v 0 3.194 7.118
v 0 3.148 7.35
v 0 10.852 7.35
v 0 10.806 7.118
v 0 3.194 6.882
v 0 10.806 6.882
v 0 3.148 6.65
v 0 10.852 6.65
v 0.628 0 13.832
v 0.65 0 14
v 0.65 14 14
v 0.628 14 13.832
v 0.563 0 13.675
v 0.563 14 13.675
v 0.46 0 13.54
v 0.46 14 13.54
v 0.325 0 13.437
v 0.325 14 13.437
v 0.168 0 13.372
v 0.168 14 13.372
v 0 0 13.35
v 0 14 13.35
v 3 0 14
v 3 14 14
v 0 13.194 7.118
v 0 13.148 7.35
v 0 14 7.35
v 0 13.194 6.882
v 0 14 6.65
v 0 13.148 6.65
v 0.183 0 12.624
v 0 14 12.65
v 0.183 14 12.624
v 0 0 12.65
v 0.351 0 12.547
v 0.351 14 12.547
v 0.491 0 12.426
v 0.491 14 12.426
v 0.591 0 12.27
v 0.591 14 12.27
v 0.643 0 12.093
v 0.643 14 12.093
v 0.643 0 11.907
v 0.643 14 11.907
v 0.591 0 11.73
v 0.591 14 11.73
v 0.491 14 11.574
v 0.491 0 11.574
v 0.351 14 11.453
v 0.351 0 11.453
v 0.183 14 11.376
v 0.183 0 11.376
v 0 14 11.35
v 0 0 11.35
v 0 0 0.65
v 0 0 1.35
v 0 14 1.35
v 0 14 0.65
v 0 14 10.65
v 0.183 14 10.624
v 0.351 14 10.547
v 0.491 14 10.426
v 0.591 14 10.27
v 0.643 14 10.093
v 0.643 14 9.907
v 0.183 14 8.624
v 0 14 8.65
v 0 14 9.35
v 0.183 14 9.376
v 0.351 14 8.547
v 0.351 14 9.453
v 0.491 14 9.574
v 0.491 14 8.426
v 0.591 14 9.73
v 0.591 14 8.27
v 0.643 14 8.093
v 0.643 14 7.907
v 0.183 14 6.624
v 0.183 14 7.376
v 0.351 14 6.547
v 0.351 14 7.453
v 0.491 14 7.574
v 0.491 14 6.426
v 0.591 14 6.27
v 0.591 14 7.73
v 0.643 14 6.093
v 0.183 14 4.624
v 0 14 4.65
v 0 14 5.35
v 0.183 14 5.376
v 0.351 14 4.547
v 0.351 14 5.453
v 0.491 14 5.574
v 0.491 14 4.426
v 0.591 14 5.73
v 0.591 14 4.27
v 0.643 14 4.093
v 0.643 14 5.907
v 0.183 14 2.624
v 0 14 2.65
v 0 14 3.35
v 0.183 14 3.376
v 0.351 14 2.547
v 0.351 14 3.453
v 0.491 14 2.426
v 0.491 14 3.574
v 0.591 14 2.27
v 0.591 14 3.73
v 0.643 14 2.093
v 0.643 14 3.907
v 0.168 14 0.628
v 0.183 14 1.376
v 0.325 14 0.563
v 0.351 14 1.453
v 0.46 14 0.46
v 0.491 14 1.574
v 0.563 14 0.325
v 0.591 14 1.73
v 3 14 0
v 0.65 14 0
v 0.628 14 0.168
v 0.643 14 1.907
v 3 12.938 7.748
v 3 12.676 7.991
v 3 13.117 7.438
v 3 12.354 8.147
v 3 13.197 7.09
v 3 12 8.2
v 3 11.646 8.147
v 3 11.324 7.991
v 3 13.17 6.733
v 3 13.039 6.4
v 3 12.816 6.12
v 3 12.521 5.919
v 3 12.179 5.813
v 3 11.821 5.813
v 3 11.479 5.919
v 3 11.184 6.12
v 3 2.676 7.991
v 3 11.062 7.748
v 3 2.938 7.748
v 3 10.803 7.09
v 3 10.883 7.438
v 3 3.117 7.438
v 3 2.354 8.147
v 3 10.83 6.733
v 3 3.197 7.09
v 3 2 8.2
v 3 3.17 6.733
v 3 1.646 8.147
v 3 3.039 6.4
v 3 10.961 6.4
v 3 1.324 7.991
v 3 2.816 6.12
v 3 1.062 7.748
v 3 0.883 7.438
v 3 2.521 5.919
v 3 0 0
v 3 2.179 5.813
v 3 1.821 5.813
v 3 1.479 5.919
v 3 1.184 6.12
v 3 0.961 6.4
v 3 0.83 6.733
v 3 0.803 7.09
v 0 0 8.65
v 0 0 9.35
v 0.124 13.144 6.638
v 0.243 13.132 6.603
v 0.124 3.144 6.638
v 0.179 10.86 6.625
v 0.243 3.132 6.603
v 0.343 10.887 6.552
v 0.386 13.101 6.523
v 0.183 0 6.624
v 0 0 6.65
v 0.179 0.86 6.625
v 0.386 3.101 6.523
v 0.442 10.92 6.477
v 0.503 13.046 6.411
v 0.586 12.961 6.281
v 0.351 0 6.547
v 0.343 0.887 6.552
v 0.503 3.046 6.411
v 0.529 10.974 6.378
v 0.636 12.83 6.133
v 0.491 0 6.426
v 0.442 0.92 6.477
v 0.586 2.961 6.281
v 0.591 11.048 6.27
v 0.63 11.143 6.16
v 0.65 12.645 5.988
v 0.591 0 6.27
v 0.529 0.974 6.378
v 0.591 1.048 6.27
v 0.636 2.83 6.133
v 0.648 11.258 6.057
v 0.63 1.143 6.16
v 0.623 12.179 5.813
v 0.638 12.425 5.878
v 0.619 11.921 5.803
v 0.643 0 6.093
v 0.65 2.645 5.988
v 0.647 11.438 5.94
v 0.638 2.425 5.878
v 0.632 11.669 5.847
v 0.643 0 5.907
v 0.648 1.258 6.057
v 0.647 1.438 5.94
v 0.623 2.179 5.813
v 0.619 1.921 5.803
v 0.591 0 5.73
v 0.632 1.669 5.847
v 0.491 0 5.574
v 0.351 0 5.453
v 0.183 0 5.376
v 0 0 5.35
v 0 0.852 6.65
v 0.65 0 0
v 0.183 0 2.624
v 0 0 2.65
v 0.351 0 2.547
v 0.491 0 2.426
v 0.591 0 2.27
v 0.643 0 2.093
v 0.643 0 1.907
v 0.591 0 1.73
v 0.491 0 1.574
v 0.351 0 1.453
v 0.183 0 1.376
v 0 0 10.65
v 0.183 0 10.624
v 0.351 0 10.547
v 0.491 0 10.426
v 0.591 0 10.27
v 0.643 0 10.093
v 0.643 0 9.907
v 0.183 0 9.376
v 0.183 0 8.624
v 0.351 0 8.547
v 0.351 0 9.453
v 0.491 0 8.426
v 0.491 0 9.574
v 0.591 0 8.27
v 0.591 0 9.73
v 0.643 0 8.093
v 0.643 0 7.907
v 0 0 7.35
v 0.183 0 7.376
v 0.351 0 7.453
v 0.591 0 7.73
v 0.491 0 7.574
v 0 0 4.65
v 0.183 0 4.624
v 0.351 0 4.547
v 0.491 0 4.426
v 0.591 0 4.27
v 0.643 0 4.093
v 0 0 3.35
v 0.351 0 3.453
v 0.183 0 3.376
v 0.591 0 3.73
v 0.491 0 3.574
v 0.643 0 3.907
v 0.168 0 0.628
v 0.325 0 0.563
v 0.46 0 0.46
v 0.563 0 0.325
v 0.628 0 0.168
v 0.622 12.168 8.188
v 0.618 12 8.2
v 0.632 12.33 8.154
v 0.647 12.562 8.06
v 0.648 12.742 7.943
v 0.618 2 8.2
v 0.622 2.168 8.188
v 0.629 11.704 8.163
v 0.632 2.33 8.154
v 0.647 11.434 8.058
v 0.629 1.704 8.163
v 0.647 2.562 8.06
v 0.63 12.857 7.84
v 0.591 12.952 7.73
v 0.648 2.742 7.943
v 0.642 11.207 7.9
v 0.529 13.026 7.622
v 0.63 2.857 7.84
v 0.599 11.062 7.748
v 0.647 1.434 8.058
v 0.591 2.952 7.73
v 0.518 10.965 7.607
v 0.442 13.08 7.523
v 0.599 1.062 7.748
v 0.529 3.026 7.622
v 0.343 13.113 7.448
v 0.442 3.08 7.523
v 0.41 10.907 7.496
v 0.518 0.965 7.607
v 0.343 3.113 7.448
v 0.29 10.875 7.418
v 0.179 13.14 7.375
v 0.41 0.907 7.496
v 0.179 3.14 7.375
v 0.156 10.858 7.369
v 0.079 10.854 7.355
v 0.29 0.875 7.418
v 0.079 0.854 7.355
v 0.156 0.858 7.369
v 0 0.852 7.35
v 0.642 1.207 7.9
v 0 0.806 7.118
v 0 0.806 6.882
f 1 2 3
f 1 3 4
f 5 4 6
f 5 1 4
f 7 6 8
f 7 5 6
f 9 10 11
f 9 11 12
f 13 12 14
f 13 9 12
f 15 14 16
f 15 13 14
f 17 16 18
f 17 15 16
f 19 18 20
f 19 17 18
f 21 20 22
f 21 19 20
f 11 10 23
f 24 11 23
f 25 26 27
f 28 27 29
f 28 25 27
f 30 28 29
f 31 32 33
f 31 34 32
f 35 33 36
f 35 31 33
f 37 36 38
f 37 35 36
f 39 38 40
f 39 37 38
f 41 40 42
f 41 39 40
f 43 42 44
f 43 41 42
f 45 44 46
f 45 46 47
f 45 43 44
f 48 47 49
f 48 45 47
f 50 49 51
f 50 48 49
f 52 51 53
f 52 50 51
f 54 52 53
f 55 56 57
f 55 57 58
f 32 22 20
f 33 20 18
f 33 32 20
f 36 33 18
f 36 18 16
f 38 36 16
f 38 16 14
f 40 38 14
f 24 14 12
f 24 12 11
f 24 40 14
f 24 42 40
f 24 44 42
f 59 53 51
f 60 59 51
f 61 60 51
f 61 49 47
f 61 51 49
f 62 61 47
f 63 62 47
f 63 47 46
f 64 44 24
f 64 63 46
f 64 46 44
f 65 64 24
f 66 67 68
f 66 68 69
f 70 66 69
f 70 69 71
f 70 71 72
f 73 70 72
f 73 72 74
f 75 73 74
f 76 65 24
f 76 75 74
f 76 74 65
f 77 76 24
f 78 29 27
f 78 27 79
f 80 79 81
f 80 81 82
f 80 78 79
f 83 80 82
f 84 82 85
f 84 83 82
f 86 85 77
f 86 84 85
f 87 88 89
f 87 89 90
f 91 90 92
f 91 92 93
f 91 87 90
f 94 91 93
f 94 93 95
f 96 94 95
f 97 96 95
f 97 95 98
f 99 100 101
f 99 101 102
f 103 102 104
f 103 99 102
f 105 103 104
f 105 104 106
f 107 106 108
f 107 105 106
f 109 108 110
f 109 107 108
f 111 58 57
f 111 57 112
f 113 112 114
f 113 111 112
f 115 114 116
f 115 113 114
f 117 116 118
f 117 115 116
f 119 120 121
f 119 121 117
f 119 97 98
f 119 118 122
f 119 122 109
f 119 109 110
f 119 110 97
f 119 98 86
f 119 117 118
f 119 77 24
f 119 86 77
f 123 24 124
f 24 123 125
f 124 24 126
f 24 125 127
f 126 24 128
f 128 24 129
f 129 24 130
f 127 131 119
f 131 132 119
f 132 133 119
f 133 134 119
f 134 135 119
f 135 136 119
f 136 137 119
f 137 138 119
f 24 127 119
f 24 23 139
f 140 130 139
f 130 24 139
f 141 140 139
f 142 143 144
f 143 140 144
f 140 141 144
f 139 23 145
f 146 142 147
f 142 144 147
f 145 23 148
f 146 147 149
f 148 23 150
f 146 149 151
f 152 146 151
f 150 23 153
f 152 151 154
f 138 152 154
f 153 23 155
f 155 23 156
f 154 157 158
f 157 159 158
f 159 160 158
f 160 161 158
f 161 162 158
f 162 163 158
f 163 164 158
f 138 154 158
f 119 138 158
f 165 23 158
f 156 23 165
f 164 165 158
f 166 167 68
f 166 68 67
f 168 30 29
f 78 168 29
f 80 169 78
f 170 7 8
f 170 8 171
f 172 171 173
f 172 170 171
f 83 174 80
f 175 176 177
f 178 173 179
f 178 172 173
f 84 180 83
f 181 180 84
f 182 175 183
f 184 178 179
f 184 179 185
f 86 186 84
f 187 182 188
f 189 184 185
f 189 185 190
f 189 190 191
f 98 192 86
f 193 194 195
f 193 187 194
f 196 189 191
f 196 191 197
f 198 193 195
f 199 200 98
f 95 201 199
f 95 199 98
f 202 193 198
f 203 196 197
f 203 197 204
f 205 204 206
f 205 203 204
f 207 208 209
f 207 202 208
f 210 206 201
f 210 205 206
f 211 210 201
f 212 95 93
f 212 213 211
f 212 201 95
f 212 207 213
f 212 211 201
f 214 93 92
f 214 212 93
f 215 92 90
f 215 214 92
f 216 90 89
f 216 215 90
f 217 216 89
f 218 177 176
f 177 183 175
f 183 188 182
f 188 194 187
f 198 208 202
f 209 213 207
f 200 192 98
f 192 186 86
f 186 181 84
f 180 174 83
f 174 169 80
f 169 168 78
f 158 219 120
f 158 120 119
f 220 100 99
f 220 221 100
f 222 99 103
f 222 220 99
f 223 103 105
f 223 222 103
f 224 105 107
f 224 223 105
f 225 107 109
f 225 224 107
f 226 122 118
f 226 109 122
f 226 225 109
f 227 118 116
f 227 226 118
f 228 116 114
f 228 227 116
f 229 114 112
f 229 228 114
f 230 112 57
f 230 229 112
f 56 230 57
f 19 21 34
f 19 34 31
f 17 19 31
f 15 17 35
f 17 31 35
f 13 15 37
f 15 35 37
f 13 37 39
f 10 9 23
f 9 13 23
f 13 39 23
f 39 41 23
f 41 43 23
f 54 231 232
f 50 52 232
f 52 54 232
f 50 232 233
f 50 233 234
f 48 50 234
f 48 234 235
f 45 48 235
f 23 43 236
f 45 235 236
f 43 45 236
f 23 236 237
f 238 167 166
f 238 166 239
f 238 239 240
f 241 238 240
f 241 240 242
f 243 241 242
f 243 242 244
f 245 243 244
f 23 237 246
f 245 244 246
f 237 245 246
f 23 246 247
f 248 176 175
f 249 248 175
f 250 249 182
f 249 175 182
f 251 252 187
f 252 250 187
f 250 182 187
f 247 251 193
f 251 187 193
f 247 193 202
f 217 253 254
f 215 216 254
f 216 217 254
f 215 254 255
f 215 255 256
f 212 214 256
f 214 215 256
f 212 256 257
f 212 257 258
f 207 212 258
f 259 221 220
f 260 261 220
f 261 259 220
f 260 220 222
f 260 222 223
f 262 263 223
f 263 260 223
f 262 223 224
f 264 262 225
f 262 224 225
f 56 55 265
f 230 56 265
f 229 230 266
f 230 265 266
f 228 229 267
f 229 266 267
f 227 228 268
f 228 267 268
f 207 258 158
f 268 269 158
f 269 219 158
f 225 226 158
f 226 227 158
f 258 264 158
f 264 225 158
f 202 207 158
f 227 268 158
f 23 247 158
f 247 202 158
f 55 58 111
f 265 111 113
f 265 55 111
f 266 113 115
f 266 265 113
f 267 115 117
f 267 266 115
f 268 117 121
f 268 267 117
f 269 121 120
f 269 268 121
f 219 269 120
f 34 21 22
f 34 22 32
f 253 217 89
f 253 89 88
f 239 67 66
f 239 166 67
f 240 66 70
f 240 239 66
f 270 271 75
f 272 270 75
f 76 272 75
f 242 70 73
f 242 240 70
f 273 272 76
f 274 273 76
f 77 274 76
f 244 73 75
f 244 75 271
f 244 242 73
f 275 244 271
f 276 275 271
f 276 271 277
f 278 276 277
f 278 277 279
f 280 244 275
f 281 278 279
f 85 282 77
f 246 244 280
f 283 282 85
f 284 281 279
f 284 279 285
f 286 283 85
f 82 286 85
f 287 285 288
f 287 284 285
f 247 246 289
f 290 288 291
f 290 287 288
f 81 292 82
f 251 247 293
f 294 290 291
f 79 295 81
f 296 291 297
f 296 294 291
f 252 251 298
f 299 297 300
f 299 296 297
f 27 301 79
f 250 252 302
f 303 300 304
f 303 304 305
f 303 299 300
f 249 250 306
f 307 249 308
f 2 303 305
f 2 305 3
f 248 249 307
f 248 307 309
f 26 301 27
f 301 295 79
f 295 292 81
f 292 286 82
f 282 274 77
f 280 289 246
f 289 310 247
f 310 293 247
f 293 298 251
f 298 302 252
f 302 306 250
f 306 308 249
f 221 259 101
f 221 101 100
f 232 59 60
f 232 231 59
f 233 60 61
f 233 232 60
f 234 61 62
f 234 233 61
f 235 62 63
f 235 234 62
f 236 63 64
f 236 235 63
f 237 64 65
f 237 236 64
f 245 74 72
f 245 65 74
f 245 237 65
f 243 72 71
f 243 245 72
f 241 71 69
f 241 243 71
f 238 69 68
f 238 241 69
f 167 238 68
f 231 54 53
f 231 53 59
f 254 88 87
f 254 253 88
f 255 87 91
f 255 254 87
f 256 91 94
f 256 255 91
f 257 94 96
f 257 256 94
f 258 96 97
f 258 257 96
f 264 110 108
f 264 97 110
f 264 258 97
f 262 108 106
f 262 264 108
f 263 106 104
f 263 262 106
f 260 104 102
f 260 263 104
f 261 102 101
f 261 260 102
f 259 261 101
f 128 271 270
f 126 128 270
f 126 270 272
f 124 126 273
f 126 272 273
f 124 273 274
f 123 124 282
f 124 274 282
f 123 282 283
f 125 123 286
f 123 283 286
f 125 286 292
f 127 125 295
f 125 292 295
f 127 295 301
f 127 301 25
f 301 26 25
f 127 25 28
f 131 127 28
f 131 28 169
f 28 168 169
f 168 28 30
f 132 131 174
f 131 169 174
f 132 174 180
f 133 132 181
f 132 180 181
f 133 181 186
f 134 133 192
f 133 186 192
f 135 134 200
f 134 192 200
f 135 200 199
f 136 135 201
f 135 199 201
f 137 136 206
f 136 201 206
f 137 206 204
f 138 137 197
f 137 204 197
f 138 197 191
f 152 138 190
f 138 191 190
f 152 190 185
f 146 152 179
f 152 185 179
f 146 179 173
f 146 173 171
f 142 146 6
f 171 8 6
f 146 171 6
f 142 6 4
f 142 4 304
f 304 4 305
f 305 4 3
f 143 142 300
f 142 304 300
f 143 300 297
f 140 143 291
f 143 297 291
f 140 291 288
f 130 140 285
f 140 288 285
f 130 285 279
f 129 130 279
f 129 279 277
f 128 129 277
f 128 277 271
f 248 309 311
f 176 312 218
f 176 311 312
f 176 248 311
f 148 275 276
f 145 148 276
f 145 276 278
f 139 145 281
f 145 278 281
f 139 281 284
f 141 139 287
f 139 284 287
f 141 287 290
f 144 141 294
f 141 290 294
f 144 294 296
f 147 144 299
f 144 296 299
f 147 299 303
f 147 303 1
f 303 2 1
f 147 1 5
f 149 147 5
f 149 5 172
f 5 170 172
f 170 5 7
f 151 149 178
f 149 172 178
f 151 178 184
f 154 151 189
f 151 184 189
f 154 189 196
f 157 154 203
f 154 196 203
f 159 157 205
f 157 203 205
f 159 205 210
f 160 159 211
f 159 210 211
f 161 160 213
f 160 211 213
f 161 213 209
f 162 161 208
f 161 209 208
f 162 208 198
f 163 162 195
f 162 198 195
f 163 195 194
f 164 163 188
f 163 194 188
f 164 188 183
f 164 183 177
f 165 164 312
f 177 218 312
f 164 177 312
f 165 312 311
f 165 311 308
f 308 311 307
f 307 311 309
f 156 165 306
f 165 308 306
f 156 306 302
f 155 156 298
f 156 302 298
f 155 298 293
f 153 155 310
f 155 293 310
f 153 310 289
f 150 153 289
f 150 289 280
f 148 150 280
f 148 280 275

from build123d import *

# Parameters (mm, degrees)
SKETCH1_W            = 3
SKETCH1_H            = 14
BOSS_EXTRUDE1_DEPTH  = 14
SKETCH2_R            = 0.65
CUT_EXTRUDE1_DEPTH   = 21.024984395
M2_CLEARANCE_HOLE1_D = 2.4


with BuildPart() as part:
    # Sketch1 → Boss-Extrude1 (new body)
    with BuildSketch(Plane(origin=(0, 0, 0), x_dir=(1, 0, 0), z_dir=(0, 1, 0))):
        with Locations((1.5, -7)):
            Rectangle(SKETCH1_W, SKETCH1_H)
    extrude(amount=BOSS_EXTRUDE1_DEPTH)

    # Sketch2 → Cut-Extrude1 (cut, through all)
    with BuildSketch(Plane(origin=(0, 0, 0), x_dir=(1, 0, 0), z_dir=(0, 1, 0))):
        Circle(SKETCH2_R)
        with Locations((0, -2)):
            Circle(SKETCH2_R)
        with Locations((0, -4)):
            Circle(SKETCH2_R)
        with Locations((0, -6)):
            Circle(SKETCH2_R)
        with Locations((0, -8)):
            Circle(SKETCH2_R)
        with Locations((0, -10)):
            Circle(SKETCH2_R)
        with Locations((0, -12)):
            Circle(SKETCH2_R)
        with Locations((0, -14)):
            Circle(SKETCH2_R)
    extrude(amount=CUT_EXTRUDE1_DEPTH, mode=Mode.SUBTRACT)

    # M2 Clearance Hole1 (through all)
    with Locations(Plane(origin=(3, 0, 0), x_dir=(0, 0, -1), z_dir=(1, 0, 0))):
        with Locations((-7, 12), (-7, 2)):
            Hole(M2_CLEARANCE_HOLE1_D / 2)


solid = part.part
